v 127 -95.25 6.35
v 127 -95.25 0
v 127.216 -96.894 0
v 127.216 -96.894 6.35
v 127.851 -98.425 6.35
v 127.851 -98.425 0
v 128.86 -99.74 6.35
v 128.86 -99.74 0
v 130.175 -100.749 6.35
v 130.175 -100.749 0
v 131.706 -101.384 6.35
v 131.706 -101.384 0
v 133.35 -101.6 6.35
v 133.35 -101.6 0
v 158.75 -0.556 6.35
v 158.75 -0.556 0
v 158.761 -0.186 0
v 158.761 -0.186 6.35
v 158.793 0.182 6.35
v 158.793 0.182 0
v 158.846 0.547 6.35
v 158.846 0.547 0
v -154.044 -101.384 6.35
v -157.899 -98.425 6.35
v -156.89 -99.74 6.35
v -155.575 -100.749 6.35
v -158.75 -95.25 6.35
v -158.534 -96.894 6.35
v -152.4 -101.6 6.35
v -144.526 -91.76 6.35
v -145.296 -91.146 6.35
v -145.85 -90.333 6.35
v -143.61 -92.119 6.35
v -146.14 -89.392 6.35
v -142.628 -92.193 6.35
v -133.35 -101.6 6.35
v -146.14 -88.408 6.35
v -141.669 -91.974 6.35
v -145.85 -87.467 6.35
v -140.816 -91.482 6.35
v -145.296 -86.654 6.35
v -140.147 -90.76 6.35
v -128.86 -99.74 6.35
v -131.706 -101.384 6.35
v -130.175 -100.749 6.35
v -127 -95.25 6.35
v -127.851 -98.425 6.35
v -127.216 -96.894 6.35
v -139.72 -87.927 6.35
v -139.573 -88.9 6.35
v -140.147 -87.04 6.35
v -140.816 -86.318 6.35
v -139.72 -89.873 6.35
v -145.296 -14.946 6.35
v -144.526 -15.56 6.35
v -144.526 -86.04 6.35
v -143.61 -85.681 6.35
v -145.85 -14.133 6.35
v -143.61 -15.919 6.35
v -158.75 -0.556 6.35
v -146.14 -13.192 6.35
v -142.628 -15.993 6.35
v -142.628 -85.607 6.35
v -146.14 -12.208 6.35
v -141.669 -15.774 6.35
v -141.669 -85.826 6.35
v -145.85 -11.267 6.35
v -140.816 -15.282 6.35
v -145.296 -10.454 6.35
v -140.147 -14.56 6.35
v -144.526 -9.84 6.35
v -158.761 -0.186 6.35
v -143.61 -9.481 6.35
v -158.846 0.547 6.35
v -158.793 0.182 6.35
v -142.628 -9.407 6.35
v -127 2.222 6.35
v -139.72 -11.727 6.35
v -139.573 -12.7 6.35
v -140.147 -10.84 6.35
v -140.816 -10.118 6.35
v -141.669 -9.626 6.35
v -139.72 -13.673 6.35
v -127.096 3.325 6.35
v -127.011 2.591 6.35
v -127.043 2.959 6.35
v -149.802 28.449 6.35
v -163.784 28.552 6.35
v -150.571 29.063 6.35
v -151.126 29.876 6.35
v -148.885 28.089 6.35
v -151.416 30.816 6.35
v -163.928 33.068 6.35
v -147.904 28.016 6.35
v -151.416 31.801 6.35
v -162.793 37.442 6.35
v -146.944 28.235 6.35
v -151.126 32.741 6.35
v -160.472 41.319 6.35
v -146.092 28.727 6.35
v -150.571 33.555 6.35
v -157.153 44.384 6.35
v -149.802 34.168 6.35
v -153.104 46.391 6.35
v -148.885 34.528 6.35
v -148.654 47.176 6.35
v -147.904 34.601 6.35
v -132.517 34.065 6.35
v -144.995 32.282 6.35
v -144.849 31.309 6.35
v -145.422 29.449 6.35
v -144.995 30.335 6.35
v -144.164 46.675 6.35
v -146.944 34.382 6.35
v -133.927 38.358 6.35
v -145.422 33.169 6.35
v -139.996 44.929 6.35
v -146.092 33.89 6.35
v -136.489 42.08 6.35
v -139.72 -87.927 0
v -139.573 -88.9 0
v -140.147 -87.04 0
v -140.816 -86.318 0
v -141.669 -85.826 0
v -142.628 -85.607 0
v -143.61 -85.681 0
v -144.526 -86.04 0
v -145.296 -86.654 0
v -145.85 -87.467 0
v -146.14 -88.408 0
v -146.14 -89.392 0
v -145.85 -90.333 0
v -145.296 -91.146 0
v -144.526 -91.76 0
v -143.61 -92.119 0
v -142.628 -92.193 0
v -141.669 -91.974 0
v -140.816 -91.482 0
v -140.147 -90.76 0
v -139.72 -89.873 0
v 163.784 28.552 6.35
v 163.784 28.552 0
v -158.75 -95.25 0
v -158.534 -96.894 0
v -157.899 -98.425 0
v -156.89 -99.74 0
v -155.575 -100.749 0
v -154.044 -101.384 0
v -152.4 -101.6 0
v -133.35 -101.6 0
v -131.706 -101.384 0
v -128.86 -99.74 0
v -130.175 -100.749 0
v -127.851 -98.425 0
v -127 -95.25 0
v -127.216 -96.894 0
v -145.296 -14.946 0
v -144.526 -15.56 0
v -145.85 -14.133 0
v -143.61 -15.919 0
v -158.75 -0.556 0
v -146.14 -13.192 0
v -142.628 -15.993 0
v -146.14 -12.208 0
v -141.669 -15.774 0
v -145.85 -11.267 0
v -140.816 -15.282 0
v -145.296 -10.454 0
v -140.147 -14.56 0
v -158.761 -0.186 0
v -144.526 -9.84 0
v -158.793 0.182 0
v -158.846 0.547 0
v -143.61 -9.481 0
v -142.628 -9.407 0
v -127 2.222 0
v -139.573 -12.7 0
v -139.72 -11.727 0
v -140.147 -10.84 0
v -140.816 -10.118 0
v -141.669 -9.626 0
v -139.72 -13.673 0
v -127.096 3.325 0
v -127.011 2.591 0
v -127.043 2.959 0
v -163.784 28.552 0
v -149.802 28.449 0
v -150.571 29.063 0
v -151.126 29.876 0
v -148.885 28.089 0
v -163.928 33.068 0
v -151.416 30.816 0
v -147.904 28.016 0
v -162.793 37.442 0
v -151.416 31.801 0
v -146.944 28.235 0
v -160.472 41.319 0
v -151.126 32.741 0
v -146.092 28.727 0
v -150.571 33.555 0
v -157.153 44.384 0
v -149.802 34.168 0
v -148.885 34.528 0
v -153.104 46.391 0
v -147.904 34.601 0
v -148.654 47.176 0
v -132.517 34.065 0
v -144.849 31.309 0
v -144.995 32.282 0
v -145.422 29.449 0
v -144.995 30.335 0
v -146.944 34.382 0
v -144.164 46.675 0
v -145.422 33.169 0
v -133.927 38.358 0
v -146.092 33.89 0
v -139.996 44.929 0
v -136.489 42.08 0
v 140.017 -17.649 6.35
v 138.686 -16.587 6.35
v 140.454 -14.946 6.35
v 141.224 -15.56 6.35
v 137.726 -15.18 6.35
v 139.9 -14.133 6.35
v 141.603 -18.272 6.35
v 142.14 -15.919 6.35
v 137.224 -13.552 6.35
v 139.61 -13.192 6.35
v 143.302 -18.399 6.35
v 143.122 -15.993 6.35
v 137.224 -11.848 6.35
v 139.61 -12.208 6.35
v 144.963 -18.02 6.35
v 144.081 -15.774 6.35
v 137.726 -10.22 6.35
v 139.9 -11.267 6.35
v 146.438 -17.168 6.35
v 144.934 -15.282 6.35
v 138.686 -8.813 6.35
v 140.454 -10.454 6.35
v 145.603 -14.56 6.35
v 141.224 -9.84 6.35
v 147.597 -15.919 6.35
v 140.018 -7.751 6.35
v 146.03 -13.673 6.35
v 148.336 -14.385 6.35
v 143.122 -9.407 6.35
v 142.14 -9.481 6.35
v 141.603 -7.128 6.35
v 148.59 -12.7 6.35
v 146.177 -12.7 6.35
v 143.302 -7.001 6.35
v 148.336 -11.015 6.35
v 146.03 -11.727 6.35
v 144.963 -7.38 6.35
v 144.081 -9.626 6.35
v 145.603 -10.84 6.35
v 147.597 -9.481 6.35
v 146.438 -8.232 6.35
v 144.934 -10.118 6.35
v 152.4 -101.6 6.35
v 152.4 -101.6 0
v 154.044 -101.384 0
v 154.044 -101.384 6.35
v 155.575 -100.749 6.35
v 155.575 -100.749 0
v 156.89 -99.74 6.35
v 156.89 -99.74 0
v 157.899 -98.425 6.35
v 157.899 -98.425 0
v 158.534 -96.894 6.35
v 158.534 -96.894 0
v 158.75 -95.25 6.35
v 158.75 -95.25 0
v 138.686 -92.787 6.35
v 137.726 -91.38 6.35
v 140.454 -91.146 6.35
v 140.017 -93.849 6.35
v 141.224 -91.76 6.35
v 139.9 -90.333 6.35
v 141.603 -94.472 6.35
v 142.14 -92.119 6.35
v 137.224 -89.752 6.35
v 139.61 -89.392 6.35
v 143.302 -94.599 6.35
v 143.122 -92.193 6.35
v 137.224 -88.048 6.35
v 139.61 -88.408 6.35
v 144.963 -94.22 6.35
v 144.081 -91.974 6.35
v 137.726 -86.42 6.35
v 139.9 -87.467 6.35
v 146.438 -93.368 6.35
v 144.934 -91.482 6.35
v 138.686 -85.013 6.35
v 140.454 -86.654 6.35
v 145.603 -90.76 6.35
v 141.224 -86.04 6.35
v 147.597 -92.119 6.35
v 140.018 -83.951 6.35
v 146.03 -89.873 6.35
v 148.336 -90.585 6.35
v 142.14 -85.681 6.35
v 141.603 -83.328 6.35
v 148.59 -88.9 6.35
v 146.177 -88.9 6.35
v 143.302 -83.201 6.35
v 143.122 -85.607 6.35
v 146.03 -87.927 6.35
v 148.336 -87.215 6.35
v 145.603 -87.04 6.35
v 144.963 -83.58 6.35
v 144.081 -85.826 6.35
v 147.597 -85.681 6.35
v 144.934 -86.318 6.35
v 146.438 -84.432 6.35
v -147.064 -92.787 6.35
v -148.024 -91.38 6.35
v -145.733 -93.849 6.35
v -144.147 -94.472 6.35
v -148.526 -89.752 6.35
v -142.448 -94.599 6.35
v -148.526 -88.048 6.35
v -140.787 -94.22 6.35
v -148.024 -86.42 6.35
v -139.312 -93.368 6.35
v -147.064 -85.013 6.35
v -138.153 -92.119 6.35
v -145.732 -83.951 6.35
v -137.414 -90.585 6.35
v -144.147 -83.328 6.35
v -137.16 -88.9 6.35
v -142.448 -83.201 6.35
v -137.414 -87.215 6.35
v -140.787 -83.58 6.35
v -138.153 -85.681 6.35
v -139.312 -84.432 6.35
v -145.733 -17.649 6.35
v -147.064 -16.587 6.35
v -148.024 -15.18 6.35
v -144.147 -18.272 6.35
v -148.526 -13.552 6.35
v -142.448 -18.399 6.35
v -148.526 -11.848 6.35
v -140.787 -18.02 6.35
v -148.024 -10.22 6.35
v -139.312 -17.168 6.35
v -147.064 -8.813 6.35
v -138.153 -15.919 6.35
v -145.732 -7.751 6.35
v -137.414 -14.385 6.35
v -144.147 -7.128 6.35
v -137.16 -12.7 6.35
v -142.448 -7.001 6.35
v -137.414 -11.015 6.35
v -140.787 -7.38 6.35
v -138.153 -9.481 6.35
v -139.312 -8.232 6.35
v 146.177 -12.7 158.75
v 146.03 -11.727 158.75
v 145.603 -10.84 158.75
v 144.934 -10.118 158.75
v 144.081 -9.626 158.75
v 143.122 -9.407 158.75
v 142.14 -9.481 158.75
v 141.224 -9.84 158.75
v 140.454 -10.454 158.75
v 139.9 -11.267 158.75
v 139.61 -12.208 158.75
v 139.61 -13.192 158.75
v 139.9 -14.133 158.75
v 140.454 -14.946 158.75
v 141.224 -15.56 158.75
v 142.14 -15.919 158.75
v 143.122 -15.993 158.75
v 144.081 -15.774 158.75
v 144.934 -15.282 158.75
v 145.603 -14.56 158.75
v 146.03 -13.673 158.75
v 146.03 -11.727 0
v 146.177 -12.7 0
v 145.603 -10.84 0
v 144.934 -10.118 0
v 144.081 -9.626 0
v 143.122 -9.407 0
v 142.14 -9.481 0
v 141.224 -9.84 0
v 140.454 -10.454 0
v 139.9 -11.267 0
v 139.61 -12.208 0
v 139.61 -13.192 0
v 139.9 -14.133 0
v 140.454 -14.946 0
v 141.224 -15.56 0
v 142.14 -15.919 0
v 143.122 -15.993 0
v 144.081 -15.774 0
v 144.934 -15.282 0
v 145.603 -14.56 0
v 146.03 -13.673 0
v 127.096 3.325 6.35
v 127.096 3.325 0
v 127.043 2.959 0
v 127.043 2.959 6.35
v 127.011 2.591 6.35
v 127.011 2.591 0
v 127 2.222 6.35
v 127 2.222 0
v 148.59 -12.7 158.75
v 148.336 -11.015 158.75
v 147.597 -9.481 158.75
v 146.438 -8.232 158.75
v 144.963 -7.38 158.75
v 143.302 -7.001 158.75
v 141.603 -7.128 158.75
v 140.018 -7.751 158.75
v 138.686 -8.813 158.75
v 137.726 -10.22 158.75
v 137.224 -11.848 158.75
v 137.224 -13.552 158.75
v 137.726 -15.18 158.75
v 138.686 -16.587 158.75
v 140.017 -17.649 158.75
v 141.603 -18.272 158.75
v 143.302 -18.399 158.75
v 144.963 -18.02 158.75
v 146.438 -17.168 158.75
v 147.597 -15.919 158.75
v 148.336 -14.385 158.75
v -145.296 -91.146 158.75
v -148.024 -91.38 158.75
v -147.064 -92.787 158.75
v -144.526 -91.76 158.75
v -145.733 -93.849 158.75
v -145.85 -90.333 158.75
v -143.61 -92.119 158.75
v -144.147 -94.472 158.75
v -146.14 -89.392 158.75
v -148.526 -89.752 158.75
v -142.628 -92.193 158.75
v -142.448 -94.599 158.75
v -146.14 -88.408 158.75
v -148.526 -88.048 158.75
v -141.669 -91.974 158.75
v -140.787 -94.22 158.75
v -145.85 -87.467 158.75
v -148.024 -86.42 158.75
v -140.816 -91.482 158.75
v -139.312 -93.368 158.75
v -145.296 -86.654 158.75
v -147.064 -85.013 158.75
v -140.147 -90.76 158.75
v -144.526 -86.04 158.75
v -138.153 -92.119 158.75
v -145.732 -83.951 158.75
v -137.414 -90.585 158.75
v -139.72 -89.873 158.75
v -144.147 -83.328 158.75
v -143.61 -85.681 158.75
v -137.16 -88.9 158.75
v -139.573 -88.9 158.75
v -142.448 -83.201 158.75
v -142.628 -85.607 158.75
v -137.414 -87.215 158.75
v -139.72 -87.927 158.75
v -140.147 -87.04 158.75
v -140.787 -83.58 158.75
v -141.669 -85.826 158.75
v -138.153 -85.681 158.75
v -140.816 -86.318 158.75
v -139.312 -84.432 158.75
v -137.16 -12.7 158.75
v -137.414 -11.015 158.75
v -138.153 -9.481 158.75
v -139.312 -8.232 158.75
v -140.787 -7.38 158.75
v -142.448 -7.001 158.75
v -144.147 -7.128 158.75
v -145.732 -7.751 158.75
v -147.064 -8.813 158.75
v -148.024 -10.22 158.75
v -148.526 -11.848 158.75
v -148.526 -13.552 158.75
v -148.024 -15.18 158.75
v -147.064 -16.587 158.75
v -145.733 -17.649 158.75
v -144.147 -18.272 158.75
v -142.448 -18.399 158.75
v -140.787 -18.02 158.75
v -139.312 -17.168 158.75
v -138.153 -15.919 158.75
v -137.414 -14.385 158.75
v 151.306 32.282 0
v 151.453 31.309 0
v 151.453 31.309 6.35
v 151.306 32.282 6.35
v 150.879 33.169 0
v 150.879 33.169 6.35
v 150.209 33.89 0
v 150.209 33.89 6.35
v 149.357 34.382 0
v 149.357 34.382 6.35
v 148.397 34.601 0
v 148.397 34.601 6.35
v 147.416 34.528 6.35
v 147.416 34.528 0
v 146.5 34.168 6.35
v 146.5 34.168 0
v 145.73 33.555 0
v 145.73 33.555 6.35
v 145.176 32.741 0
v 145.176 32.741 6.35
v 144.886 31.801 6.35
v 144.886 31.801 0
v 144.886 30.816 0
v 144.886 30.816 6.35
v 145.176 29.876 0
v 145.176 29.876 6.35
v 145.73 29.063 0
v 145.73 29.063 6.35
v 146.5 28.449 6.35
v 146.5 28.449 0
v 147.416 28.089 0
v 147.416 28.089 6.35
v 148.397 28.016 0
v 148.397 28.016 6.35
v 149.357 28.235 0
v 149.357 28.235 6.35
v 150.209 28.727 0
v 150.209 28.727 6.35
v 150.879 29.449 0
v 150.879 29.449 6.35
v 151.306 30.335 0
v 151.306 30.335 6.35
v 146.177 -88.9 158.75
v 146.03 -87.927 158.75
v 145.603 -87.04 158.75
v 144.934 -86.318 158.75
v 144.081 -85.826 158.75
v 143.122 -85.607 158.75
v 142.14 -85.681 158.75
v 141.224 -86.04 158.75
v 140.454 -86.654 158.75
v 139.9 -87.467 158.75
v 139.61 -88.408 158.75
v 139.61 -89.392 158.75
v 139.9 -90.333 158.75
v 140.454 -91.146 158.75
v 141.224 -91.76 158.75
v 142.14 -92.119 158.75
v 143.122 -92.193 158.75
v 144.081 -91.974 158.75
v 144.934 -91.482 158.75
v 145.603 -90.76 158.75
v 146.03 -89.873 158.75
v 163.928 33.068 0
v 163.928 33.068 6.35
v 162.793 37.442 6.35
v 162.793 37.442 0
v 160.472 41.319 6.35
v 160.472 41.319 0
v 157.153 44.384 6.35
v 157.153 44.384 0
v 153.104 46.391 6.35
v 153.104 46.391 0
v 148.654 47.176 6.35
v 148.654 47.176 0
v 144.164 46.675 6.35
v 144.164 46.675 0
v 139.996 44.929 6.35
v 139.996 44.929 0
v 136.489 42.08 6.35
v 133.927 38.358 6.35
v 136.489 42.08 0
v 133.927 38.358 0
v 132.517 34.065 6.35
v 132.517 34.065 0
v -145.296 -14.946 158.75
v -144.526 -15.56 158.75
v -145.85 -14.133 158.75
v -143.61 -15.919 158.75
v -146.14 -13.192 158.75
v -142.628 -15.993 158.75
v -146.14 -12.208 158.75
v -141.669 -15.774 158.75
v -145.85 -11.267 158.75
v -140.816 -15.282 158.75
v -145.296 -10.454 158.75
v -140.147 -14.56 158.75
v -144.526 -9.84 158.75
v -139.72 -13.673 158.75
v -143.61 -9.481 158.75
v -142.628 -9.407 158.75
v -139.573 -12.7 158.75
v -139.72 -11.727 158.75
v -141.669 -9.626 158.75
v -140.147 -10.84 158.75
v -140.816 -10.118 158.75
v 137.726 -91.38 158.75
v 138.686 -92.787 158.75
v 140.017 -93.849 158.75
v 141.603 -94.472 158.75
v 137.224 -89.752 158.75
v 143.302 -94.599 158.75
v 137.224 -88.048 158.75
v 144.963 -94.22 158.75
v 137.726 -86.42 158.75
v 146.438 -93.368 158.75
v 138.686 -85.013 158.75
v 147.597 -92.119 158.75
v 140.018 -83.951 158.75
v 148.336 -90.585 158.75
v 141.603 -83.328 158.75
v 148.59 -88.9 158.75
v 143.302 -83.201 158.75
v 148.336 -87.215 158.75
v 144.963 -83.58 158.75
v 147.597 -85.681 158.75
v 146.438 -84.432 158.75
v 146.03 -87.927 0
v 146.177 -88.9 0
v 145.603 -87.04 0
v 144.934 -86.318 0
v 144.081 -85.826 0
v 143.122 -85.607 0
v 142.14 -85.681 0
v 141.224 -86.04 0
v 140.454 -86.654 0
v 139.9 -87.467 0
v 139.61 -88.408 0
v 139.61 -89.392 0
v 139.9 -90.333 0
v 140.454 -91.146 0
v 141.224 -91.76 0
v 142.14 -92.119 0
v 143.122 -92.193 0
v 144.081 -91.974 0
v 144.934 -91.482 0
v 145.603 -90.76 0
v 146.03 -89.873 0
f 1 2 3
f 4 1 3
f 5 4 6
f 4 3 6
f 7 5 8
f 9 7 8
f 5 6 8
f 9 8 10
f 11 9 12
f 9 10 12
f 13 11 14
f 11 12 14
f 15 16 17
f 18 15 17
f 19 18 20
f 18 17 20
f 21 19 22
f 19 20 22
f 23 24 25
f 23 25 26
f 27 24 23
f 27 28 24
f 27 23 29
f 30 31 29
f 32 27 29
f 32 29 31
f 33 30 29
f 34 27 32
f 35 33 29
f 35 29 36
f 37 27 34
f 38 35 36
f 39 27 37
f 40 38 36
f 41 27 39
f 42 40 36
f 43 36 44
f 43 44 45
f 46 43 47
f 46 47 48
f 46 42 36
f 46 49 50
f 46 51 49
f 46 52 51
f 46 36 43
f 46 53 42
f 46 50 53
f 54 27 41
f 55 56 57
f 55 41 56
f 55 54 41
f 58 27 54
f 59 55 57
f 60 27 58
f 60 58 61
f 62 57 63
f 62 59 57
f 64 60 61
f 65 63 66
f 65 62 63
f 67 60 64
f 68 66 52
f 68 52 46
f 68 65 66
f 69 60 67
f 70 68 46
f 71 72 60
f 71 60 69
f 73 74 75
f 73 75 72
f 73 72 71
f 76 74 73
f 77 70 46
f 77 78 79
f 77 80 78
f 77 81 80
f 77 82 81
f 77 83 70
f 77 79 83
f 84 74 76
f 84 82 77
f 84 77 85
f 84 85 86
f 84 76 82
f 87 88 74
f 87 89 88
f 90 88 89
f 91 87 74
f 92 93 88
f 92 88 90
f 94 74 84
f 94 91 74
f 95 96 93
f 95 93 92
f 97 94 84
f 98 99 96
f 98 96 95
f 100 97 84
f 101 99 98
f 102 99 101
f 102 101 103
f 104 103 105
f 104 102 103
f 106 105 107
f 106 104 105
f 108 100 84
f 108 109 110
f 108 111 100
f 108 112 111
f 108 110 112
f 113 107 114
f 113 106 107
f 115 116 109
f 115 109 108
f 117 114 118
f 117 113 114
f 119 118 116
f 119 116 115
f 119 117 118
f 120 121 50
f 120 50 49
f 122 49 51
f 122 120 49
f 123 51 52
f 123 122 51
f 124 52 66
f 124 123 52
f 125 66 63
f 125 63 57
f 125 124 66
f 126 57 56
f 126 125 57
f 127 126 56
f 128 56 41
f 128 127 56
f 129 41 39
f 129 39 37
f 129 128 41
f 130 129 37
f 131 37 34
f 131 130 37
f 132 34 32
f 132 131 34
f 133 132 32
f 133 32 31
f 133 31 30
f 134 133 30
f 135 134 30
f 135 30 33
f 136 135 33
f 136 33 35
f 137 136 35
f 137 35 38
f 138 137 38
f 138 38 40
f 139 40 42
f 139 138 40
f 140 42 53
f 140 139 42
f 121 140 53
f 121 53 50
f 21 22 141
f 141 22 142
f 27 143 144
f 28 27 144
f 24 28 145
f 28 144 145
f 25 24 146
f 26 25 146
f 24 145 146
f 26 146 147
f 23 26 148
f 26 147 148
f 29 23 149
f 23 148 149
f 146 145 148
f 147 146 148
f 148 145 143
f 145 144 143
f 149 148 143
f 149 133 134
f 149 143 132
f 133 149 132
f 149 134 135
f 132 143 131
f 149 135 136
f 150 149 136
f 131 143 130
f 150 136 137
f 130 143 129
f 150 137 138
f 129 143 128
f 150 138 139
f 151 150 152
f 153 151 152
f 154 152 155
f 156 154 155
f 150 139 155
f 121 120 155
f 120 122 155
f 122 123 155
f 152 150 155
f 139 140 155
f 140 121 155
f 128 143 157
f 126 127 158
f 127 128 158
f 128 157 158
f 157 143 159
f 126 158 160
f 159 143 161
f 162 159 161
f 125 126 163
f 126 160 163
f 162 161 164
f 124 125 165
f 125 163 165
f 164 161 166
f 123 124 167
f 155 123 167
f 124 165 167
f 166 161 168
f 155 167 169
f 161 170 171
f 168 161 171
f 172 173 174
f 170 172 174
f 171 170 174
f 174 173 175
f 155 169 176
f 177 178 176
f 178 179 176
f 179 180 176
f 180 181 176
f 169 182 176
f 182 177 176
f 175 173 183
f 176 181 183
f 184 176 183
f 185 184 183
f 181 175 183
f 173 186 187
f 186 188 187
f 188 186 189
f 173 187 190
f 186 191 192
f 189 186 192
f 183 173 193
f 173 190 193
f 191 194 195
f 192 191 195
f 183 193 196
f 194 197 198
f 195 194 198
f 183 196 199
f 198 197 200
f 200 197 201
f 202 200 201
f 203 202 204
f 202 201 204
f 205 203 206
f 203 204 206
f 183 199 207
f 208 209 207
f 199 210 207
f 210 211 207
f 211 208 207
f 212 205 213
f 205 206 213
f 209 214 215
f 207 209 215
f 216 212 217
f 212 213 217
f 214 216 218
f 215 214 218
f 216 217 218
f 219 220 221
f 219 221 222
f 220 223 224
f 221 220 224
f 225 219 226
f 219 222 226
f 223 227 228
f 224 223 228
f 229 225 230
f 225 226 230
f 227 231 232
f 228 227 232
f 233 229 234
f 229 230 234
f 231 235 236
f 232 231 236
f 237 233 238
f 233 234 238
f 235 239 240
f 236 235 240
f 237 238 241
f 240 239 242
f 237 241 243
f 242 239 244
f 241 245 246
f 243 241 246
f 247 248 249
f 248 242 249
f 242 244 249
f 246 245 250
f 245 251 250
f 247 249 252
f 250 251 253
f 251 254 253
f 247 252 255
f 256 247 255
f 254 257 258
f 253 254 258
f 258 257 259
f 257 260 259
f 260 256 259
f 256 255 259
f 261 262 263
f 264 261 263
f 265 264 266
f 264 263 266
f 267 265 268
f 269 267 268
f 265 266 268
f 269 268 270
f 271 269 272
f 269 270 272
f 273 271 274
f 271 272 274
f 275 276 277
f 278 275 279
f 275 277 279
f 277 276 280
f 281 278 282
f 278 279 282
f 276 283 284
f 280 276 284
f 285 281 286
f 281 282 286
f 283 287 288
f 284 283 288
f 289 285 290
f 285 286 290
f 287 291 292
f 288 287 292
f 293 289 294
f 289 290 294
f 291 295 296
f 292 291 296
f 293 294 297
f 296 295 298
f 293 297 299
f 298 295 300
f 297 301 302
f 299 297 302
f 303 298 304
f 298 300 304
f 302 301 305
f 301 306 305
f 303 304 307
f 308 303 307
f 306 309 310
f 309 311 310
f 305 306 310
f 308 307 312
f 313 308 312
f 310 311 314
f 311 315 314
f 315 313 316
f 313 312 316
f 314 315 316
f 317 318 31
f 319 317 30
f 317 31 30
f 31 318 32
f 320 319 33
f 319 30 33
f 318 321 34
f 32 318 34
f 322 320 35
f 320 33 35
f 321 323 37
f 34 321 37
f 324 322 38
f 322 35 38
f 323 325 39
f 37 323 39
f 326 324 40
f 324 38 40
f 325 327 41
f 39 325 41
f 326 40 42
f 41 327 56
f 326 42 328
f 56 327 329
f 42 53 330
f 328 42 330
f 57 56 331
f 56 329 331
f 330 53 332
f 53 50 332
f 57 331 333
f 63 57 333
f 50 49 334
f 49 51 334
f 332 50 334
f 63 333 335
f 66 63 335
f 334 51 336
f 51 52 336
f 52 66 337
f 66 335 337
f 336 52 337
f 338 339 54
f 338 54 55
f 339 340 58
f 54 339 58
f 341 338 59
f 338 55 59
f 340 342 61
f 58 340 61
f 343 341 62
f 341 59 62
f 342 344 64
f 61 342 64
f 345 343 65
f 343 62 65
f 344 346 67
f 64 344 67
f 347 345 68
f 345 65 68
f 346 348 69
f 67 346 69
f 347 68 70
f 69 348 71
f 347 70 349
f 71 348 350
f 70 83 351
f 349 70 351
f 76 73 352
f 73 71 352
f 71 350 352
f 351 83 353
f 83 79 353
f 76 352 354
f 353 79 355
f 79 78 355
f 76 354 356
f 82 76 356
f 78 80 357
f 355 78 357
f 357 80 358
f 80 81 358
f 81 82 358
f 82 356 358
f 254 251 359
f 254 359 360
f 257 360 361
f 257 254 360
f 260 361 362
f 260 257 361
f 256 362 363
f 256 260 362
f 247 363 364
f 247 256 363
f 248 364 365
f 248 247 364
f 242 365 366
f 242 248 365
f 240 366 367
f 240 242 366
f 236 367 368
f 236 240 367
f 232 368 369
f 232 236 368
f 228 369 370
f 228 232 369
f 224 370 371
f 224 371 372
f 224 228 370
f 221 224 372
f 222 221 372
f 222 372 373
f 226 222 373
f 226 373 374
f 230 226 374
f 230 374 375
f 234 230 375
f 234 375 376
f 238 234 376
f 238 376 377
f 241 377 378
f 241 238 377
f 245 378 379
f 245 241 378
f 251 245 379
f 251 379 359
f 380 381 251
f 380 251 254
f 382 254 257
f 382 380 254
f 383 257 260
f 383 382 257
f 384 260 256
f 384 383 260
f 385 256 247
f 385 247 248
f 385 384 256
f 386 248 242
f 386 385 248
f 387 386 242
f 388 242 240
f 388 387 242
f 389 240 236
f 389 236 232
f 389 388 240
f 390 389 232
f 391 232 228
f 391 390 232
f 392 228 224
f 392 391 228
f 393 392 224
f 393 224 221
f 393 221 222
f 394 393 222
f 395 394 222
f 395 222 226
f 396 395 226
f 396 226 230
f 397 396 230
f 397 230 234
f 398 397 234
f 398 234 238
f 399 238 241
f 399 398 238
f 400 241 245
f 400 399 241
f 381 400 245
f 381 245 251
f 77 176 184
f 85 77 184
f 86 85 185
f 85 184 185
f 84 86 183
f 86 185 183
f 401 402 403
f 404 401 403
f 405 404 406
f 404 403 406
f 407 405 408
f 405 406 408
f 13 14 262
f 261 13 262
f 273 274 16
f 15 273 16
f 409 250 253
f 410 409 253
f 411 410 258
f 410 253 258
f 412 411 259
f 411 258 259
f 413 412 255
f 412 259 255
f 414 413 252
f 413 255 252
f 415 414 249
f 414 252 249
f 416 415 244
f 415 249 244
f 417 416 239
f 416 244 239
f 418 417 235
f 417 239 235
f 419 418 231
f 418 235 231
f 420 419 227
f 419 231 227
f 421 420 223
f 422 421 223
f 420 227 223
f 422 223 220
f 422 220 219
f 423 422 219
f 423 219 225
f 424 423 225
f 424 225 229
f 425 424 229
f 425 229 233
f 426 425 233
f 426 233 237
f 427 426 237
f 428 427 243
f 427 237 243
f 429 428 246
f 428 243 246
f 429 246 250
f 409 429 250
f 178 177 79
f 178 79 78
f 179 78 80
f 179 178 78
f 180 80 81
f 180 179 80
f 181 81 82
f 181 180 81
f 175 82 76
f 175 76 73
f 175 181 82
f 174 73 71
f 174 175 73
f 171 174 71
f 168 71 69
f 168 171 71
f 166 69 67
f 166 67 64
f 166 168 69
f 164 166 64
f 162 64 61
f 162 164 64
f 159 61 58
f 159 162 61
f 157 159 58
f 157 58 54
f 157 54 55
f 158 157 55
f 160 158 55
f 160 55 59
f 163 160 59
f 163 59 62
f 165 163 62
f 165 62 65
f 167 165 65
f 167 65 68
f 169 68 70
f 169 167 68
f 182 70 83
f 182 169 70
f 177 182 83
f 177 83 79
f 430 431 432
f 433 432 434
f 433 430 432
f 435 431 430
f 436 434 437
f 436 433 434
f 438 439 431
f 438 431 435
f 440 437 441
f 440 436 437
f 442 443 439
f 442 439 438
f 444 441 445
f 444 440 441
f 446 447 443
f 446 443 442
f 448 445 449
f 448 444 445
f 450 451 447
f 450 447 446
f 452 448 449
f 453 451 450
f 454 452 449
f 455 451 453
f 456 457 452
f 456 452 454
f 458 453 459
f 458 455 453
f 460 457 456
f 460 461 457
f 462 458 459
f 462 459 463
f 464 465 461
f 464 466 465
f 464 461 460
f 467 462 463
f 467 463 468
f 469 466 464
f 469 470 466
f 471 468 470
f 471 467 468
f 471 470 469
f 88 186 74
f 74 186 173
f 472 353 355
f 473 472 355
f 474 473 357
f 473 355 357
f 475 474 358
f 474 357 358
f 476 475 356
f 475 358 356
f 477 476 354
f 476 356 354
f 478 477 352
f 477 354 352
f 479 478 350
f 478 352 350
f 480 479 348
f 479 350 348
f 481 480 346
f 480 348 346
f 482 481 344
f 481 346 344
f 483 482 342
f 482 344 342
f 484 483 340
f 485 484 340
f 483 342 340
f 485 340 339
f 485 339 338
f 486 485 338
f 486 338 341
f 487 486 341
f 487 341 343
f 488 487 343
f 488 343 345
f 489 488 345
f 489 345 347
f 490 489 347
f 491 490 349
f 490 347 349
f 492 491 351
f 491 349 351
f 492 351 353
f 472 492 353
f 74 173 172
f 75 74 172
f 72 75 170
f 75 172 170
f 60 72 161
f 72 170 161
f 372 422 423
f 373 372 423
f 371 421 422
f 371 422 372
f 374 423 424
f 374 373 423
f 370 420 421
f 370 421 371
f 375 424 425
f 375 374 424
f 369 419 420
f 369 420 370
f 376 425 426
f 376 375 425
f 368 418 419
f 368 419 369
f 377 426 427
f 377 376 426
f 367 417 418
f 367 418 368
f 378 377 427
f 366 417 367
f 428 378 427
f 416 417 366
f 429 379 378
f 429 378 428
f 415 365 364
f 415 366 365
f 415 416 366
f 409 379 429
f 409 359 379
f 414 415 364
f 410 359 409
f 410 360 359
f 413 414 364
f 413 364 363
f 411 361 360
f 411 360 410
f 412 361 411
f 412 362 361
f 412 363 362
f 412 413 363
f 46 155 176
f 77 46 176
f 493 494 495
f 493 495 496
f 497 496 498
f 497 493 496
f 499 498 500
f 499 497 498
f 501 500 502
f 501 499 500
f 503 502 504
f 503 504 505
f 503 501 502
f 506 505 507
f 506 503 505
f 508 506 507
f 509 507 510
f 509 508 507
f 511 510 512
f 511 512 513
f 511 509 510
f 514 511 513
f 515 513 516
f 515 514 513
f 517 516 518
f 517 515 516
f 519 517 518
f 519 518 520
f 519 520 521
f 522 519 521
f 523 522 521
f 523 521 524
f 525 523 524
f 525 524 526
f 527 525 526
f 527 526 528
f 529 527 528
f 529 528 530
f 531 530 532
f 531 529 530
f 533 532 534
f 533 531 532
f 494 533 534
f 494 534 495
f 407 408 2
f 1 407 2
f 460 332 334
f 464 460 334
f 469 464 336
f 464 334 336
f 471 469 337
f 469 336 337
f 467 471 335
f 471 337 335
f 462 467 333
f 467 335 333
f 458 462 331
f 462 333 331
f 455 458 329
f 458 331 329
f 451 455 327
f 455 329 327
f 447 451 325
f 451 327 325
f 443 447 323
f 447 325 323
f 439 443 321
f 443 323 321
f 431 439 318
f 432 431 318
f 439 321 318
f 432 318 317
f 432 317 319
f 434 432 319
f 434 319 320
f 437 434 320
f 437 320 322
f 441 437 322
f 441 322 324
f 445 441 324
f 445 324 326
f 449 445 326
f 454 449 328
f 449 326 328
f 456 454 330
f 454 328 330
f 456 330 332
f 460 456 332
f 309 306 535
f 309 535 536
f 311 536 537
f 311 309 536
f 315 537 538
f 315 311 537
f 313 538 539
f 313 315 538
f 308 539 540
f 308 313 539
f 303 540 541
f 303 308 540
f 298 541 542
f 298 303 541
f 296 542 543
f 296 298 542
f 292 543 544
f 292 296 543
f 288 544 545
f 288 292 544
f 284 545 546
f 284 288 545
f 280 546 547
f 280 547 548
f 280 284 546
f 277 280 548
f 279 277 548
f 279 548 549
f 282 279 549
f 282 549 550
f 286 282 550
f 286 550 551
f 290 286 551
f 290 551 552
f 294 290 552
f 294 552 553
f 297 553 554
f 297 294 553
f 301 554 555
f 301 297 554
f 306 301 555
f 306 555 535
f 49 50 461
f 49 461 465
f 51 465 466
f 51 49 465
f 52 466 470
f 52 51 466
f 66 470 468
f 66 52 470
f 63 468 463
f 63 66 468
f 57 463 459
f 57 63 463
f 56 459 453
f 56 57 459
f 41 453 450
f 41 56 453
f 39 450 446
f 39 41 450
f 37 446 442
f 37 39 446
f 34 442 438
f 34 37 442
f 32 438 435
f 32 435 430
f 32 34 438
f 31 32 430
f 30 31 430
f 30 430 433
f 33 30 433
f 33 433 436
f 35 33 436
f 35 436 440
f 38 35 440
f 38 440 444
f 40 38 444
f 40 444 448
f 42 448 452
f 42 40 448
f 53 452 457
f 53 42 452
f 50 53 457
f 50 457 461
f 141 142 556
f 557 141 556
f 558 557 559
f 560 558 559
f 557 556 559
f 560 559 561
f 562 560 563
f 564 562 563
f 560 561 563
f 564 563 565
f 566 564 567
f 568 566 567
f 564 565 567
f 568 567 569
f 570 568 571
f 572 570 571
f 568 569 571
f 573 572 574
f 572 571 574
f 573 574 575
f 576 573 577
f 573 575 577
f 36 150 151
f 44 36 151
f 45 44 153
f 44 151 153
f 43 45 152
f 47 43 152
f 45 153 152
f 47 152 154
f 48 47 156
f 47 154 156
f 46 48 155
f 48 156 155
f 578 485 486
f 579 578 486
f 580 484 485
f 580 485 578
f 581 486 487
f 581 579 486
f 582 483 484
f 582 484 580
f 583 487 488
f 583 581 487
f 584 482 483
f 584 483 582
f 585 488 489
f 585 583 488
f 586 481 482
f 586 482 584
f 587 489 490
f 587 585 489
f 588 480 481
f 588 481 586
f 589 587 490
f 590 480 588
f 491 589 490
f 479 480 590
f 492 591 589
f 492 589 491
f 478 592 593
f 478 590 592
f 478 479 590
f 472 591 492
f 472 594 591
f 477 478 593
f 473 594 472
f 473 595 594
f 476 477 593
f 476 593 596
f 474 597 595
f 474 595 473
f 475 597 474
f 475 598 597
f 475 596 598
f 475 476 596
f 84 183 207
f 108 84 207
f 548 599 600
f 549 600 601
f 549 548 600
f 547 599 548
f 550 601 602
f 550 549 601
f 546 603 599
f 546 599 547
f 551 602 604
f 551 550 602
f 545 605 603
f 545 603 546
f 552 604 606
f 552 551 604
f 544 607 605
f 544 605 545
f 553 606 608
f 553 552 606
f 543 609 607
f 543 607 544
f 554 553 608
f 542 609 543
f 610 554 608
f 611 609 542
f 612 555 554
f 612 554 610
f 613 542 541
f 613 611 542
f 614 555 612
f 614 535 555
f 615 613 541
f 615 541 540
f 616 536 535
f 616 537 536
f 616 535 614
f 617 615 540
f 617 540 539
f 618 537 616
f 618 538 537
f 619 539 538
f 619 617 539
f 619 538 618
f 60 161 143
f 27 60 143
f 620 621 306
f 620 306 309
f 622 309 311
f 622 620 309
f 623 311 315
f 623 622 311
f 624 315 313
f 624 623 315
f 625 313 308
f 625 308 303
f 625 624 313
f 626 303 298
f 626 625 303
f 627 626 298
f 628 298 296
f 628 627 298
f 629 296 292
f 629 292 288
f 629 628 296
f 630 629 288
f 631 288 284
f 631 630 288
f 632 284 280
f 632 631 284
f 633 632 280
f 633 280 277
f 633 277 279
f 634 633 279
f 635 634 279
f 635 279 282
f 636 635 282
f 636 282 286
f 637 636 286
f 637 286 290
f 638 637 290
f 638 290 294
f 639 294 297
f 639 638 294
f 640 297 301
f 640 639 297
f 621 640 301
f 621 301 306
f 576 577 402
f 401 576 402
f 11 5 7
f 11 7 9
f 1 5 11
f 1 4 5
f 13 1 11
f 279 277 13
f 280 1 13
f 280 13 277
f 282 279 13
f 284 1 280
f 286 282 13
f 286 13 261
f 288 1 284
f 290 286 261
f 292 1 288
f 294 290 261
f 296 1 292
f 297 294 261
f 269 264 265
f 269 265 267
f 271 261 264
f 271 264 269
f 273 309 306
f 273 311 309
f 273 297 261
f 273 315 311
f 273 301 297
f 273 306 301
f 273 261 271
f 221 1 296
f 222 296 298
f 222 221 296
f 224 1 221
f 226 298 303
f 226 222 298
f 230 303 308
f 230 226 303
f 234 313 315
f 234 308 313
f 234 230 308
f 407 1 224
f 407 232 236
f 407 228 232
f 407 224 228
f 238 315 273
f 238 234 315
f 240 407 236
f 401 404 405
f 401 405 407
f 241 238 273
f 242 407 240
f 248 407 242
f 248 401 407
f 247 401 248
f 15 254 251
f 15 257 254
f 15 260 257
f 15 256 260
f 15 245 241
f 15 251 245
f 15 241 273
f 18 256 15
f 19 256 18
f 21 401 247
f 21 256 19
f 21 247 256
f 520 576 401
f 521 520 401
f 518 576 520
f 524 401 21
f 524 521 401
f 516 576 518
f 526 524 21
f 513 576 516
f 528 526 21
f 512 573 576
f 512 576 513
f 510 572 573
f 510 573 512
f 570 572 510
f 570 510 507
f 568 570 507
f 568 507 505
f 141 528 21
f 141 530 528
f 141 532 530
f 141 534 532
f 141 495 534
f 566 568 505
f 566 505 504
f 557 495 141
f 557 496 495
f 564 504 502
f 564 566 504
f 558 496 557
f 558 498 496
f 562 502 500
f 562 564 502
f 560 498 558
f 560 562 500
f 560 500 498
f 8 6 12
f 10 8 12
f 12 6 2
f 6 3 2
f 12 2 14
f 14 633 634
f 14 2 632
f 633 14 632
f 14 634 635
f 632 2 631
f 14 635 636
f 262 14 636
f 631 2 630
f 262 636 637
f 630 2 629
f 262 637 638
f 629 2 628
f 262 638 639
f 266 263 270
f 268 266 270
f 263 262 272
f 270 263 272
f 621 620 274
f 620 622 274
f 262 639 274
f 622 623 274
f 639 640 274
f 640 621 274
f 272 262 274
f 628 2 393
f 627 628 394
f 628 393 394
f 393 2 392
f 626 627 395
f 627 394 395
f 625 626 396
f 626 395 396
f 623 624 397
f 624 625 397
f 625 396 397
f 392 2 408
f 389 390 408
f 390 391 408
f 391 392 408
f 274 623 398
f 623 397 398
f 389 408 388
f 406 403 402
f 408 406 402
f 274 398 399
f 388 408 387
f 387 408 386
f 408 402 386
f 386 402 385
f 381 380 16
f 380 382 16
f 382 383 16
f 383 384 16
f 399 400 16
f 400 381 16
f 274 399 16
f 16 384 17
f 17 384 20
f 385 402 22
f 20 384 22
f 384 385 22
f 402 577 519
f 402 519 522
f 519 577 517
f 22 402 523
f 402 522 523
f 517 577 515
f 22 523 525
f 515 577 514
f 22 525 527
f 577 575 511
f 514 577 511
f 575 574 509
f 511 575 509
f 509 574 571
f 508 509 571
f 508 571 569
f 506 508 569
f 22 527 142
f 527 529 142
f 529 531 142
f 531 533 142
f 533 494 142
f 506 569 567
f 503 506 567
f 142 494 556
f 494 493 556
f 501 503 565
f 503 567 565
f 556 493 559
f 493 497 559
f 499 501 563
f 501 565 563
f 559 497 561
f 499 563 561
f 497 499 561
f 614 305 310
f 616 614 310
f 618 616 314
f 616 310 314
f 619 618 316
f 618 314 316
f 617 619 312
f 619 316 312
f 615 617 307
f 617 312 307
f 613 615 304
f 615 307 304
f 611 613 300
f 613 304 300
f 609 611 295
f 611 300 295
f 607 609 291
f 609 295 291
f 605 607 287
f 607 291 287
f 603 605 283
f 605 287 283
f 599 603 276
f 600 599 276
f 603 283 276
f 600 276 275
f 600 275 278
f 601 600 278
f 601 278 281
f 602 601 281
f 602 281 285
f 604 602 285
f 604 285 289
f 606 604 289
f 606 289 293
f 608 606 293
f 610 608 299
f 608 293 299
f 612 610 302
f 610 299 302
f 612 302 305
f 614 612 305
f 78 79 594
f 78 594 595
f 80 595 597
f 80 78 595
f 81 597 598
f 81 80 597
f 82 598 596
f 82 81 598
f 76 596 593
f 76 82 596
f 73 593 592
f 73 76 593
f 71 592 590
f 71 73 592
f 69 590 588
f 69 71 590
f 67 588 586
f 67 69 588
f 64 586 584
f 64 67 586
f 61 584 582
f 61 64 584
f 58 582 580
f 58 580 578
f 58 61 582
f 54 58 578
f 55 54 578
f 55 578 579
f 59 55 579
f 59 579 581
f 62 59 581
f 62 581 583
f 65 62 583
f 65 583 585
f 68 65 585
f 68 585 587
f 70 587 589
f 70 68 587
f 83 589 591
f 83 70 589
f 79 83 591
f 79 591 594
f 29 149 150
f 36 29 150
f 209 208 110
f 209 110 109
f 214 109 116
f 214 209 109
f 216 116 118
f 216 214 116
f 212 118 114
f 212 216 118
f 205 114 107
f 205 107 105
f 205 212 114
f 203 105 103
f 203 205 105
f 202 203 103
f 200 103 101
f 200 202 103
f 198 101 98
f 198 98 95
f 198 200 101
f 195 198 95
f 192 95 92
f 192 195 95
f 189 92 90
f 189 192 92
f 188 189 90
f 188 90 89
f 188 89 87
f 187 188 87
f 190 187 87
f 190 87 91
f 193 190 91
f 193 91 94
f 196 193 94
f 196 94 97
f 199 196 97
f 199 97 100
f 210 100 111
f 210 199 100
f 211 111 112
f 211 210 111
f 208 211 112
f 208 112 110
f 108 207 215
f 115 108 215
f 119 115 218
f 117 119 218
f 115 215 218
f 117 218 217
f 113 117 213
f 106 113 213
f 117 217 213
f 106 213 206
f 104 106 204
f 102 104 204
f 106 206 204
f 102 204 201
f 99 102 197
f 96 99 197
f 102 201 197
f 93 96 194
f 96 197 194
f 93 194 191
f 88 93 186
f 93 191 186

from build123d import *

# Parameters (mm, degrees)
F0_R     = 3.302
F1_DEPTH = 6.35
F2_R     = 5.715
F2_R_2   = 3.302
F3_DEPTH = 152.4


# Not quite as in the source:
# - a feature names something its author has since deleted; it is built from what else it names


with BuildPart() as f1:
    # F0 (on Top) → F1 (new body)
    with BuildSketch(Plane.XY):
        with BuildLine():
            ThreePointArc((-132.5168345954, 34.0652888097), (-150.9073224949, 46.9424470683), (-163.7844807535, 28.5519591688))
            Line((-163.7844807535, 28.5519591688), (-158.8464707684, 0.5471129148))
            ThreePointArc((-158.8464707684, 0.5471129148), (-158.7741636671, -0.0021140469), (-158.75, -0.5555530134))
            Line((-158.75, -0.5555530134), (-158.75, -95.25))
            ThreePointArc((-158.75, -95.25), (-156.8901280605, -99.7401280605), (-152.4, -101.6))
            Line((-152.4, -101.6), (-133.35, -101.6))
            ThreePointArc((-133.35, -101.6), (-128.8598719395, -99.7401280605), (-127, -95.25))
            Line((-127, -95.25), (-127, 0))
            Line((-127, 0), (-127, 2.2222120536))
            ThreePointArc((-127, 2.2222120536), (-127.0241636671, 2.77565102), (-127.0964707684, 3.3248779817))
            Line((-127.0964707684, 3.3248779817), (-132.5168345954, 34.0652888097))
        make_face()
        with Locations((-142.875, -88.9)):
            Circle(F0_R, mode=Mode.SUBTRACT)
        with Locations((-142.875, -12.7)):
            Circle(F0_R, mode=Mode.SUBTRACT)
        with Locations((-148.1506576745, 31.3086239893)):
            Circle(F0_R, mode=Mode.SUBTRACT)
    extrude(amount=F1_DEPTH)


with BuildPart() as f1b:
    # F0 (on Top) → F1, piece 2 (new body)
    with BuildSketch(Plane.XY):
        with BuildLine():
            ThreePointArc((163.7844807535, 28.5519591688), (150.9073224949, 46.9424470683), (132.5168345954, 34.0652888097))
            Line((132.5168345954, 34.0652888097), (127.0964707684, 3.3248779817))
            ThreePointArc((127.0964707684, 3.3248779817), (127.0241636671, 2.77565102), (127, 2.2222120536))
            Line((127, 2.2222120536), (127, 0))
            Line((127, 0), (127, -95.25))
            ThreePointArc((127, -95.25), (128.8598719395, -99.7401280605), (133.35, -101.6))
            Line((133.35, -101.6), (152.4, -101.6))
            ThreePointArc((152.4, -101.6), (156.8901280605, -99.7401280605), (158.75, -95.25))
            Line((158.75, -95.25), (158.75, -0.5555530134))
            ThreePointArc((158.75, -0.5555530134), (158.7741636671, -0.0021140469), (158.8464707684, 0.5471129148))
            Line((158.8464707684, 0.5471129148), (163.7844807535, 28.5519591688))
        make_face()
        with Locations((142.875, -88.9)):
            Circle(F0_R, mode=Mode.SUBTRACT)
        with Locations((142.875, -12.7)):
            Circle(F0_R, mode=Mode.SUBTRACT)
        with Locations((148.1506576745, 31.3086239893)):
            Circle(F0_R, mode=Mode.SUBTRACT)
    extrude(amount=F1_DEPTH)


with BuildPart() as f3:
    # F2 (on face) → F3 (new body)
    with BuildSketch(Plane.XY.offset(6.35)):
        with Locations((-142.875, -12.7)):
            Circle(F2_R)
        with Locations((-142.875, -12.7)):
            Circle(F2_R_2, mode=Mode.SUBTRACT)
    extrude(amount=F3_DEPTH)


with BuildPart() as f3b:
    # F2 (on face) → F3, piece 2 (new body)
    with BuildSketch(Plane.XY.offset(6.35)):
        with Locations((-142.875, -88.9)):
            Circle(F2_R)
        with Locations((-142.875, -88.9)):
            Circle(F2_R_2, mode=Mode.SUBTRACT)
    extrude(amount=F3_DEPTH)


with BuildPart() as f3c:
    # F2 (on face) → F3, piece 3 (new body)
    with BuildSketch(Plane.XY.offset(6.35)):
        with Locations((142.875, -12.7)):
            Circle(F2_R)
        with Locations((142.875, -12.7)):
            Circle(F2_R_2, mode=Mode.SUBTRACT)
    extrude(amount=F3_DEPTH)


with BuildPart() as f3d:
    # F2 (on face) → F3, piece 4 (new body)
    with BuildSketch(Plane.XY.offset(6.35)):
        with Locations((142.875, -88.9)):
            Circle(F2_R)
        with Locations((142.875, -88.9)):
            Circle(F2_R_2, mode=Mode.SUBTRACT)
    extrude(amount=F3_DEPTH)


solid = Compound([f1.part, f1b.part, f3.part, f3b.part, f3c.part, f3d.part])
